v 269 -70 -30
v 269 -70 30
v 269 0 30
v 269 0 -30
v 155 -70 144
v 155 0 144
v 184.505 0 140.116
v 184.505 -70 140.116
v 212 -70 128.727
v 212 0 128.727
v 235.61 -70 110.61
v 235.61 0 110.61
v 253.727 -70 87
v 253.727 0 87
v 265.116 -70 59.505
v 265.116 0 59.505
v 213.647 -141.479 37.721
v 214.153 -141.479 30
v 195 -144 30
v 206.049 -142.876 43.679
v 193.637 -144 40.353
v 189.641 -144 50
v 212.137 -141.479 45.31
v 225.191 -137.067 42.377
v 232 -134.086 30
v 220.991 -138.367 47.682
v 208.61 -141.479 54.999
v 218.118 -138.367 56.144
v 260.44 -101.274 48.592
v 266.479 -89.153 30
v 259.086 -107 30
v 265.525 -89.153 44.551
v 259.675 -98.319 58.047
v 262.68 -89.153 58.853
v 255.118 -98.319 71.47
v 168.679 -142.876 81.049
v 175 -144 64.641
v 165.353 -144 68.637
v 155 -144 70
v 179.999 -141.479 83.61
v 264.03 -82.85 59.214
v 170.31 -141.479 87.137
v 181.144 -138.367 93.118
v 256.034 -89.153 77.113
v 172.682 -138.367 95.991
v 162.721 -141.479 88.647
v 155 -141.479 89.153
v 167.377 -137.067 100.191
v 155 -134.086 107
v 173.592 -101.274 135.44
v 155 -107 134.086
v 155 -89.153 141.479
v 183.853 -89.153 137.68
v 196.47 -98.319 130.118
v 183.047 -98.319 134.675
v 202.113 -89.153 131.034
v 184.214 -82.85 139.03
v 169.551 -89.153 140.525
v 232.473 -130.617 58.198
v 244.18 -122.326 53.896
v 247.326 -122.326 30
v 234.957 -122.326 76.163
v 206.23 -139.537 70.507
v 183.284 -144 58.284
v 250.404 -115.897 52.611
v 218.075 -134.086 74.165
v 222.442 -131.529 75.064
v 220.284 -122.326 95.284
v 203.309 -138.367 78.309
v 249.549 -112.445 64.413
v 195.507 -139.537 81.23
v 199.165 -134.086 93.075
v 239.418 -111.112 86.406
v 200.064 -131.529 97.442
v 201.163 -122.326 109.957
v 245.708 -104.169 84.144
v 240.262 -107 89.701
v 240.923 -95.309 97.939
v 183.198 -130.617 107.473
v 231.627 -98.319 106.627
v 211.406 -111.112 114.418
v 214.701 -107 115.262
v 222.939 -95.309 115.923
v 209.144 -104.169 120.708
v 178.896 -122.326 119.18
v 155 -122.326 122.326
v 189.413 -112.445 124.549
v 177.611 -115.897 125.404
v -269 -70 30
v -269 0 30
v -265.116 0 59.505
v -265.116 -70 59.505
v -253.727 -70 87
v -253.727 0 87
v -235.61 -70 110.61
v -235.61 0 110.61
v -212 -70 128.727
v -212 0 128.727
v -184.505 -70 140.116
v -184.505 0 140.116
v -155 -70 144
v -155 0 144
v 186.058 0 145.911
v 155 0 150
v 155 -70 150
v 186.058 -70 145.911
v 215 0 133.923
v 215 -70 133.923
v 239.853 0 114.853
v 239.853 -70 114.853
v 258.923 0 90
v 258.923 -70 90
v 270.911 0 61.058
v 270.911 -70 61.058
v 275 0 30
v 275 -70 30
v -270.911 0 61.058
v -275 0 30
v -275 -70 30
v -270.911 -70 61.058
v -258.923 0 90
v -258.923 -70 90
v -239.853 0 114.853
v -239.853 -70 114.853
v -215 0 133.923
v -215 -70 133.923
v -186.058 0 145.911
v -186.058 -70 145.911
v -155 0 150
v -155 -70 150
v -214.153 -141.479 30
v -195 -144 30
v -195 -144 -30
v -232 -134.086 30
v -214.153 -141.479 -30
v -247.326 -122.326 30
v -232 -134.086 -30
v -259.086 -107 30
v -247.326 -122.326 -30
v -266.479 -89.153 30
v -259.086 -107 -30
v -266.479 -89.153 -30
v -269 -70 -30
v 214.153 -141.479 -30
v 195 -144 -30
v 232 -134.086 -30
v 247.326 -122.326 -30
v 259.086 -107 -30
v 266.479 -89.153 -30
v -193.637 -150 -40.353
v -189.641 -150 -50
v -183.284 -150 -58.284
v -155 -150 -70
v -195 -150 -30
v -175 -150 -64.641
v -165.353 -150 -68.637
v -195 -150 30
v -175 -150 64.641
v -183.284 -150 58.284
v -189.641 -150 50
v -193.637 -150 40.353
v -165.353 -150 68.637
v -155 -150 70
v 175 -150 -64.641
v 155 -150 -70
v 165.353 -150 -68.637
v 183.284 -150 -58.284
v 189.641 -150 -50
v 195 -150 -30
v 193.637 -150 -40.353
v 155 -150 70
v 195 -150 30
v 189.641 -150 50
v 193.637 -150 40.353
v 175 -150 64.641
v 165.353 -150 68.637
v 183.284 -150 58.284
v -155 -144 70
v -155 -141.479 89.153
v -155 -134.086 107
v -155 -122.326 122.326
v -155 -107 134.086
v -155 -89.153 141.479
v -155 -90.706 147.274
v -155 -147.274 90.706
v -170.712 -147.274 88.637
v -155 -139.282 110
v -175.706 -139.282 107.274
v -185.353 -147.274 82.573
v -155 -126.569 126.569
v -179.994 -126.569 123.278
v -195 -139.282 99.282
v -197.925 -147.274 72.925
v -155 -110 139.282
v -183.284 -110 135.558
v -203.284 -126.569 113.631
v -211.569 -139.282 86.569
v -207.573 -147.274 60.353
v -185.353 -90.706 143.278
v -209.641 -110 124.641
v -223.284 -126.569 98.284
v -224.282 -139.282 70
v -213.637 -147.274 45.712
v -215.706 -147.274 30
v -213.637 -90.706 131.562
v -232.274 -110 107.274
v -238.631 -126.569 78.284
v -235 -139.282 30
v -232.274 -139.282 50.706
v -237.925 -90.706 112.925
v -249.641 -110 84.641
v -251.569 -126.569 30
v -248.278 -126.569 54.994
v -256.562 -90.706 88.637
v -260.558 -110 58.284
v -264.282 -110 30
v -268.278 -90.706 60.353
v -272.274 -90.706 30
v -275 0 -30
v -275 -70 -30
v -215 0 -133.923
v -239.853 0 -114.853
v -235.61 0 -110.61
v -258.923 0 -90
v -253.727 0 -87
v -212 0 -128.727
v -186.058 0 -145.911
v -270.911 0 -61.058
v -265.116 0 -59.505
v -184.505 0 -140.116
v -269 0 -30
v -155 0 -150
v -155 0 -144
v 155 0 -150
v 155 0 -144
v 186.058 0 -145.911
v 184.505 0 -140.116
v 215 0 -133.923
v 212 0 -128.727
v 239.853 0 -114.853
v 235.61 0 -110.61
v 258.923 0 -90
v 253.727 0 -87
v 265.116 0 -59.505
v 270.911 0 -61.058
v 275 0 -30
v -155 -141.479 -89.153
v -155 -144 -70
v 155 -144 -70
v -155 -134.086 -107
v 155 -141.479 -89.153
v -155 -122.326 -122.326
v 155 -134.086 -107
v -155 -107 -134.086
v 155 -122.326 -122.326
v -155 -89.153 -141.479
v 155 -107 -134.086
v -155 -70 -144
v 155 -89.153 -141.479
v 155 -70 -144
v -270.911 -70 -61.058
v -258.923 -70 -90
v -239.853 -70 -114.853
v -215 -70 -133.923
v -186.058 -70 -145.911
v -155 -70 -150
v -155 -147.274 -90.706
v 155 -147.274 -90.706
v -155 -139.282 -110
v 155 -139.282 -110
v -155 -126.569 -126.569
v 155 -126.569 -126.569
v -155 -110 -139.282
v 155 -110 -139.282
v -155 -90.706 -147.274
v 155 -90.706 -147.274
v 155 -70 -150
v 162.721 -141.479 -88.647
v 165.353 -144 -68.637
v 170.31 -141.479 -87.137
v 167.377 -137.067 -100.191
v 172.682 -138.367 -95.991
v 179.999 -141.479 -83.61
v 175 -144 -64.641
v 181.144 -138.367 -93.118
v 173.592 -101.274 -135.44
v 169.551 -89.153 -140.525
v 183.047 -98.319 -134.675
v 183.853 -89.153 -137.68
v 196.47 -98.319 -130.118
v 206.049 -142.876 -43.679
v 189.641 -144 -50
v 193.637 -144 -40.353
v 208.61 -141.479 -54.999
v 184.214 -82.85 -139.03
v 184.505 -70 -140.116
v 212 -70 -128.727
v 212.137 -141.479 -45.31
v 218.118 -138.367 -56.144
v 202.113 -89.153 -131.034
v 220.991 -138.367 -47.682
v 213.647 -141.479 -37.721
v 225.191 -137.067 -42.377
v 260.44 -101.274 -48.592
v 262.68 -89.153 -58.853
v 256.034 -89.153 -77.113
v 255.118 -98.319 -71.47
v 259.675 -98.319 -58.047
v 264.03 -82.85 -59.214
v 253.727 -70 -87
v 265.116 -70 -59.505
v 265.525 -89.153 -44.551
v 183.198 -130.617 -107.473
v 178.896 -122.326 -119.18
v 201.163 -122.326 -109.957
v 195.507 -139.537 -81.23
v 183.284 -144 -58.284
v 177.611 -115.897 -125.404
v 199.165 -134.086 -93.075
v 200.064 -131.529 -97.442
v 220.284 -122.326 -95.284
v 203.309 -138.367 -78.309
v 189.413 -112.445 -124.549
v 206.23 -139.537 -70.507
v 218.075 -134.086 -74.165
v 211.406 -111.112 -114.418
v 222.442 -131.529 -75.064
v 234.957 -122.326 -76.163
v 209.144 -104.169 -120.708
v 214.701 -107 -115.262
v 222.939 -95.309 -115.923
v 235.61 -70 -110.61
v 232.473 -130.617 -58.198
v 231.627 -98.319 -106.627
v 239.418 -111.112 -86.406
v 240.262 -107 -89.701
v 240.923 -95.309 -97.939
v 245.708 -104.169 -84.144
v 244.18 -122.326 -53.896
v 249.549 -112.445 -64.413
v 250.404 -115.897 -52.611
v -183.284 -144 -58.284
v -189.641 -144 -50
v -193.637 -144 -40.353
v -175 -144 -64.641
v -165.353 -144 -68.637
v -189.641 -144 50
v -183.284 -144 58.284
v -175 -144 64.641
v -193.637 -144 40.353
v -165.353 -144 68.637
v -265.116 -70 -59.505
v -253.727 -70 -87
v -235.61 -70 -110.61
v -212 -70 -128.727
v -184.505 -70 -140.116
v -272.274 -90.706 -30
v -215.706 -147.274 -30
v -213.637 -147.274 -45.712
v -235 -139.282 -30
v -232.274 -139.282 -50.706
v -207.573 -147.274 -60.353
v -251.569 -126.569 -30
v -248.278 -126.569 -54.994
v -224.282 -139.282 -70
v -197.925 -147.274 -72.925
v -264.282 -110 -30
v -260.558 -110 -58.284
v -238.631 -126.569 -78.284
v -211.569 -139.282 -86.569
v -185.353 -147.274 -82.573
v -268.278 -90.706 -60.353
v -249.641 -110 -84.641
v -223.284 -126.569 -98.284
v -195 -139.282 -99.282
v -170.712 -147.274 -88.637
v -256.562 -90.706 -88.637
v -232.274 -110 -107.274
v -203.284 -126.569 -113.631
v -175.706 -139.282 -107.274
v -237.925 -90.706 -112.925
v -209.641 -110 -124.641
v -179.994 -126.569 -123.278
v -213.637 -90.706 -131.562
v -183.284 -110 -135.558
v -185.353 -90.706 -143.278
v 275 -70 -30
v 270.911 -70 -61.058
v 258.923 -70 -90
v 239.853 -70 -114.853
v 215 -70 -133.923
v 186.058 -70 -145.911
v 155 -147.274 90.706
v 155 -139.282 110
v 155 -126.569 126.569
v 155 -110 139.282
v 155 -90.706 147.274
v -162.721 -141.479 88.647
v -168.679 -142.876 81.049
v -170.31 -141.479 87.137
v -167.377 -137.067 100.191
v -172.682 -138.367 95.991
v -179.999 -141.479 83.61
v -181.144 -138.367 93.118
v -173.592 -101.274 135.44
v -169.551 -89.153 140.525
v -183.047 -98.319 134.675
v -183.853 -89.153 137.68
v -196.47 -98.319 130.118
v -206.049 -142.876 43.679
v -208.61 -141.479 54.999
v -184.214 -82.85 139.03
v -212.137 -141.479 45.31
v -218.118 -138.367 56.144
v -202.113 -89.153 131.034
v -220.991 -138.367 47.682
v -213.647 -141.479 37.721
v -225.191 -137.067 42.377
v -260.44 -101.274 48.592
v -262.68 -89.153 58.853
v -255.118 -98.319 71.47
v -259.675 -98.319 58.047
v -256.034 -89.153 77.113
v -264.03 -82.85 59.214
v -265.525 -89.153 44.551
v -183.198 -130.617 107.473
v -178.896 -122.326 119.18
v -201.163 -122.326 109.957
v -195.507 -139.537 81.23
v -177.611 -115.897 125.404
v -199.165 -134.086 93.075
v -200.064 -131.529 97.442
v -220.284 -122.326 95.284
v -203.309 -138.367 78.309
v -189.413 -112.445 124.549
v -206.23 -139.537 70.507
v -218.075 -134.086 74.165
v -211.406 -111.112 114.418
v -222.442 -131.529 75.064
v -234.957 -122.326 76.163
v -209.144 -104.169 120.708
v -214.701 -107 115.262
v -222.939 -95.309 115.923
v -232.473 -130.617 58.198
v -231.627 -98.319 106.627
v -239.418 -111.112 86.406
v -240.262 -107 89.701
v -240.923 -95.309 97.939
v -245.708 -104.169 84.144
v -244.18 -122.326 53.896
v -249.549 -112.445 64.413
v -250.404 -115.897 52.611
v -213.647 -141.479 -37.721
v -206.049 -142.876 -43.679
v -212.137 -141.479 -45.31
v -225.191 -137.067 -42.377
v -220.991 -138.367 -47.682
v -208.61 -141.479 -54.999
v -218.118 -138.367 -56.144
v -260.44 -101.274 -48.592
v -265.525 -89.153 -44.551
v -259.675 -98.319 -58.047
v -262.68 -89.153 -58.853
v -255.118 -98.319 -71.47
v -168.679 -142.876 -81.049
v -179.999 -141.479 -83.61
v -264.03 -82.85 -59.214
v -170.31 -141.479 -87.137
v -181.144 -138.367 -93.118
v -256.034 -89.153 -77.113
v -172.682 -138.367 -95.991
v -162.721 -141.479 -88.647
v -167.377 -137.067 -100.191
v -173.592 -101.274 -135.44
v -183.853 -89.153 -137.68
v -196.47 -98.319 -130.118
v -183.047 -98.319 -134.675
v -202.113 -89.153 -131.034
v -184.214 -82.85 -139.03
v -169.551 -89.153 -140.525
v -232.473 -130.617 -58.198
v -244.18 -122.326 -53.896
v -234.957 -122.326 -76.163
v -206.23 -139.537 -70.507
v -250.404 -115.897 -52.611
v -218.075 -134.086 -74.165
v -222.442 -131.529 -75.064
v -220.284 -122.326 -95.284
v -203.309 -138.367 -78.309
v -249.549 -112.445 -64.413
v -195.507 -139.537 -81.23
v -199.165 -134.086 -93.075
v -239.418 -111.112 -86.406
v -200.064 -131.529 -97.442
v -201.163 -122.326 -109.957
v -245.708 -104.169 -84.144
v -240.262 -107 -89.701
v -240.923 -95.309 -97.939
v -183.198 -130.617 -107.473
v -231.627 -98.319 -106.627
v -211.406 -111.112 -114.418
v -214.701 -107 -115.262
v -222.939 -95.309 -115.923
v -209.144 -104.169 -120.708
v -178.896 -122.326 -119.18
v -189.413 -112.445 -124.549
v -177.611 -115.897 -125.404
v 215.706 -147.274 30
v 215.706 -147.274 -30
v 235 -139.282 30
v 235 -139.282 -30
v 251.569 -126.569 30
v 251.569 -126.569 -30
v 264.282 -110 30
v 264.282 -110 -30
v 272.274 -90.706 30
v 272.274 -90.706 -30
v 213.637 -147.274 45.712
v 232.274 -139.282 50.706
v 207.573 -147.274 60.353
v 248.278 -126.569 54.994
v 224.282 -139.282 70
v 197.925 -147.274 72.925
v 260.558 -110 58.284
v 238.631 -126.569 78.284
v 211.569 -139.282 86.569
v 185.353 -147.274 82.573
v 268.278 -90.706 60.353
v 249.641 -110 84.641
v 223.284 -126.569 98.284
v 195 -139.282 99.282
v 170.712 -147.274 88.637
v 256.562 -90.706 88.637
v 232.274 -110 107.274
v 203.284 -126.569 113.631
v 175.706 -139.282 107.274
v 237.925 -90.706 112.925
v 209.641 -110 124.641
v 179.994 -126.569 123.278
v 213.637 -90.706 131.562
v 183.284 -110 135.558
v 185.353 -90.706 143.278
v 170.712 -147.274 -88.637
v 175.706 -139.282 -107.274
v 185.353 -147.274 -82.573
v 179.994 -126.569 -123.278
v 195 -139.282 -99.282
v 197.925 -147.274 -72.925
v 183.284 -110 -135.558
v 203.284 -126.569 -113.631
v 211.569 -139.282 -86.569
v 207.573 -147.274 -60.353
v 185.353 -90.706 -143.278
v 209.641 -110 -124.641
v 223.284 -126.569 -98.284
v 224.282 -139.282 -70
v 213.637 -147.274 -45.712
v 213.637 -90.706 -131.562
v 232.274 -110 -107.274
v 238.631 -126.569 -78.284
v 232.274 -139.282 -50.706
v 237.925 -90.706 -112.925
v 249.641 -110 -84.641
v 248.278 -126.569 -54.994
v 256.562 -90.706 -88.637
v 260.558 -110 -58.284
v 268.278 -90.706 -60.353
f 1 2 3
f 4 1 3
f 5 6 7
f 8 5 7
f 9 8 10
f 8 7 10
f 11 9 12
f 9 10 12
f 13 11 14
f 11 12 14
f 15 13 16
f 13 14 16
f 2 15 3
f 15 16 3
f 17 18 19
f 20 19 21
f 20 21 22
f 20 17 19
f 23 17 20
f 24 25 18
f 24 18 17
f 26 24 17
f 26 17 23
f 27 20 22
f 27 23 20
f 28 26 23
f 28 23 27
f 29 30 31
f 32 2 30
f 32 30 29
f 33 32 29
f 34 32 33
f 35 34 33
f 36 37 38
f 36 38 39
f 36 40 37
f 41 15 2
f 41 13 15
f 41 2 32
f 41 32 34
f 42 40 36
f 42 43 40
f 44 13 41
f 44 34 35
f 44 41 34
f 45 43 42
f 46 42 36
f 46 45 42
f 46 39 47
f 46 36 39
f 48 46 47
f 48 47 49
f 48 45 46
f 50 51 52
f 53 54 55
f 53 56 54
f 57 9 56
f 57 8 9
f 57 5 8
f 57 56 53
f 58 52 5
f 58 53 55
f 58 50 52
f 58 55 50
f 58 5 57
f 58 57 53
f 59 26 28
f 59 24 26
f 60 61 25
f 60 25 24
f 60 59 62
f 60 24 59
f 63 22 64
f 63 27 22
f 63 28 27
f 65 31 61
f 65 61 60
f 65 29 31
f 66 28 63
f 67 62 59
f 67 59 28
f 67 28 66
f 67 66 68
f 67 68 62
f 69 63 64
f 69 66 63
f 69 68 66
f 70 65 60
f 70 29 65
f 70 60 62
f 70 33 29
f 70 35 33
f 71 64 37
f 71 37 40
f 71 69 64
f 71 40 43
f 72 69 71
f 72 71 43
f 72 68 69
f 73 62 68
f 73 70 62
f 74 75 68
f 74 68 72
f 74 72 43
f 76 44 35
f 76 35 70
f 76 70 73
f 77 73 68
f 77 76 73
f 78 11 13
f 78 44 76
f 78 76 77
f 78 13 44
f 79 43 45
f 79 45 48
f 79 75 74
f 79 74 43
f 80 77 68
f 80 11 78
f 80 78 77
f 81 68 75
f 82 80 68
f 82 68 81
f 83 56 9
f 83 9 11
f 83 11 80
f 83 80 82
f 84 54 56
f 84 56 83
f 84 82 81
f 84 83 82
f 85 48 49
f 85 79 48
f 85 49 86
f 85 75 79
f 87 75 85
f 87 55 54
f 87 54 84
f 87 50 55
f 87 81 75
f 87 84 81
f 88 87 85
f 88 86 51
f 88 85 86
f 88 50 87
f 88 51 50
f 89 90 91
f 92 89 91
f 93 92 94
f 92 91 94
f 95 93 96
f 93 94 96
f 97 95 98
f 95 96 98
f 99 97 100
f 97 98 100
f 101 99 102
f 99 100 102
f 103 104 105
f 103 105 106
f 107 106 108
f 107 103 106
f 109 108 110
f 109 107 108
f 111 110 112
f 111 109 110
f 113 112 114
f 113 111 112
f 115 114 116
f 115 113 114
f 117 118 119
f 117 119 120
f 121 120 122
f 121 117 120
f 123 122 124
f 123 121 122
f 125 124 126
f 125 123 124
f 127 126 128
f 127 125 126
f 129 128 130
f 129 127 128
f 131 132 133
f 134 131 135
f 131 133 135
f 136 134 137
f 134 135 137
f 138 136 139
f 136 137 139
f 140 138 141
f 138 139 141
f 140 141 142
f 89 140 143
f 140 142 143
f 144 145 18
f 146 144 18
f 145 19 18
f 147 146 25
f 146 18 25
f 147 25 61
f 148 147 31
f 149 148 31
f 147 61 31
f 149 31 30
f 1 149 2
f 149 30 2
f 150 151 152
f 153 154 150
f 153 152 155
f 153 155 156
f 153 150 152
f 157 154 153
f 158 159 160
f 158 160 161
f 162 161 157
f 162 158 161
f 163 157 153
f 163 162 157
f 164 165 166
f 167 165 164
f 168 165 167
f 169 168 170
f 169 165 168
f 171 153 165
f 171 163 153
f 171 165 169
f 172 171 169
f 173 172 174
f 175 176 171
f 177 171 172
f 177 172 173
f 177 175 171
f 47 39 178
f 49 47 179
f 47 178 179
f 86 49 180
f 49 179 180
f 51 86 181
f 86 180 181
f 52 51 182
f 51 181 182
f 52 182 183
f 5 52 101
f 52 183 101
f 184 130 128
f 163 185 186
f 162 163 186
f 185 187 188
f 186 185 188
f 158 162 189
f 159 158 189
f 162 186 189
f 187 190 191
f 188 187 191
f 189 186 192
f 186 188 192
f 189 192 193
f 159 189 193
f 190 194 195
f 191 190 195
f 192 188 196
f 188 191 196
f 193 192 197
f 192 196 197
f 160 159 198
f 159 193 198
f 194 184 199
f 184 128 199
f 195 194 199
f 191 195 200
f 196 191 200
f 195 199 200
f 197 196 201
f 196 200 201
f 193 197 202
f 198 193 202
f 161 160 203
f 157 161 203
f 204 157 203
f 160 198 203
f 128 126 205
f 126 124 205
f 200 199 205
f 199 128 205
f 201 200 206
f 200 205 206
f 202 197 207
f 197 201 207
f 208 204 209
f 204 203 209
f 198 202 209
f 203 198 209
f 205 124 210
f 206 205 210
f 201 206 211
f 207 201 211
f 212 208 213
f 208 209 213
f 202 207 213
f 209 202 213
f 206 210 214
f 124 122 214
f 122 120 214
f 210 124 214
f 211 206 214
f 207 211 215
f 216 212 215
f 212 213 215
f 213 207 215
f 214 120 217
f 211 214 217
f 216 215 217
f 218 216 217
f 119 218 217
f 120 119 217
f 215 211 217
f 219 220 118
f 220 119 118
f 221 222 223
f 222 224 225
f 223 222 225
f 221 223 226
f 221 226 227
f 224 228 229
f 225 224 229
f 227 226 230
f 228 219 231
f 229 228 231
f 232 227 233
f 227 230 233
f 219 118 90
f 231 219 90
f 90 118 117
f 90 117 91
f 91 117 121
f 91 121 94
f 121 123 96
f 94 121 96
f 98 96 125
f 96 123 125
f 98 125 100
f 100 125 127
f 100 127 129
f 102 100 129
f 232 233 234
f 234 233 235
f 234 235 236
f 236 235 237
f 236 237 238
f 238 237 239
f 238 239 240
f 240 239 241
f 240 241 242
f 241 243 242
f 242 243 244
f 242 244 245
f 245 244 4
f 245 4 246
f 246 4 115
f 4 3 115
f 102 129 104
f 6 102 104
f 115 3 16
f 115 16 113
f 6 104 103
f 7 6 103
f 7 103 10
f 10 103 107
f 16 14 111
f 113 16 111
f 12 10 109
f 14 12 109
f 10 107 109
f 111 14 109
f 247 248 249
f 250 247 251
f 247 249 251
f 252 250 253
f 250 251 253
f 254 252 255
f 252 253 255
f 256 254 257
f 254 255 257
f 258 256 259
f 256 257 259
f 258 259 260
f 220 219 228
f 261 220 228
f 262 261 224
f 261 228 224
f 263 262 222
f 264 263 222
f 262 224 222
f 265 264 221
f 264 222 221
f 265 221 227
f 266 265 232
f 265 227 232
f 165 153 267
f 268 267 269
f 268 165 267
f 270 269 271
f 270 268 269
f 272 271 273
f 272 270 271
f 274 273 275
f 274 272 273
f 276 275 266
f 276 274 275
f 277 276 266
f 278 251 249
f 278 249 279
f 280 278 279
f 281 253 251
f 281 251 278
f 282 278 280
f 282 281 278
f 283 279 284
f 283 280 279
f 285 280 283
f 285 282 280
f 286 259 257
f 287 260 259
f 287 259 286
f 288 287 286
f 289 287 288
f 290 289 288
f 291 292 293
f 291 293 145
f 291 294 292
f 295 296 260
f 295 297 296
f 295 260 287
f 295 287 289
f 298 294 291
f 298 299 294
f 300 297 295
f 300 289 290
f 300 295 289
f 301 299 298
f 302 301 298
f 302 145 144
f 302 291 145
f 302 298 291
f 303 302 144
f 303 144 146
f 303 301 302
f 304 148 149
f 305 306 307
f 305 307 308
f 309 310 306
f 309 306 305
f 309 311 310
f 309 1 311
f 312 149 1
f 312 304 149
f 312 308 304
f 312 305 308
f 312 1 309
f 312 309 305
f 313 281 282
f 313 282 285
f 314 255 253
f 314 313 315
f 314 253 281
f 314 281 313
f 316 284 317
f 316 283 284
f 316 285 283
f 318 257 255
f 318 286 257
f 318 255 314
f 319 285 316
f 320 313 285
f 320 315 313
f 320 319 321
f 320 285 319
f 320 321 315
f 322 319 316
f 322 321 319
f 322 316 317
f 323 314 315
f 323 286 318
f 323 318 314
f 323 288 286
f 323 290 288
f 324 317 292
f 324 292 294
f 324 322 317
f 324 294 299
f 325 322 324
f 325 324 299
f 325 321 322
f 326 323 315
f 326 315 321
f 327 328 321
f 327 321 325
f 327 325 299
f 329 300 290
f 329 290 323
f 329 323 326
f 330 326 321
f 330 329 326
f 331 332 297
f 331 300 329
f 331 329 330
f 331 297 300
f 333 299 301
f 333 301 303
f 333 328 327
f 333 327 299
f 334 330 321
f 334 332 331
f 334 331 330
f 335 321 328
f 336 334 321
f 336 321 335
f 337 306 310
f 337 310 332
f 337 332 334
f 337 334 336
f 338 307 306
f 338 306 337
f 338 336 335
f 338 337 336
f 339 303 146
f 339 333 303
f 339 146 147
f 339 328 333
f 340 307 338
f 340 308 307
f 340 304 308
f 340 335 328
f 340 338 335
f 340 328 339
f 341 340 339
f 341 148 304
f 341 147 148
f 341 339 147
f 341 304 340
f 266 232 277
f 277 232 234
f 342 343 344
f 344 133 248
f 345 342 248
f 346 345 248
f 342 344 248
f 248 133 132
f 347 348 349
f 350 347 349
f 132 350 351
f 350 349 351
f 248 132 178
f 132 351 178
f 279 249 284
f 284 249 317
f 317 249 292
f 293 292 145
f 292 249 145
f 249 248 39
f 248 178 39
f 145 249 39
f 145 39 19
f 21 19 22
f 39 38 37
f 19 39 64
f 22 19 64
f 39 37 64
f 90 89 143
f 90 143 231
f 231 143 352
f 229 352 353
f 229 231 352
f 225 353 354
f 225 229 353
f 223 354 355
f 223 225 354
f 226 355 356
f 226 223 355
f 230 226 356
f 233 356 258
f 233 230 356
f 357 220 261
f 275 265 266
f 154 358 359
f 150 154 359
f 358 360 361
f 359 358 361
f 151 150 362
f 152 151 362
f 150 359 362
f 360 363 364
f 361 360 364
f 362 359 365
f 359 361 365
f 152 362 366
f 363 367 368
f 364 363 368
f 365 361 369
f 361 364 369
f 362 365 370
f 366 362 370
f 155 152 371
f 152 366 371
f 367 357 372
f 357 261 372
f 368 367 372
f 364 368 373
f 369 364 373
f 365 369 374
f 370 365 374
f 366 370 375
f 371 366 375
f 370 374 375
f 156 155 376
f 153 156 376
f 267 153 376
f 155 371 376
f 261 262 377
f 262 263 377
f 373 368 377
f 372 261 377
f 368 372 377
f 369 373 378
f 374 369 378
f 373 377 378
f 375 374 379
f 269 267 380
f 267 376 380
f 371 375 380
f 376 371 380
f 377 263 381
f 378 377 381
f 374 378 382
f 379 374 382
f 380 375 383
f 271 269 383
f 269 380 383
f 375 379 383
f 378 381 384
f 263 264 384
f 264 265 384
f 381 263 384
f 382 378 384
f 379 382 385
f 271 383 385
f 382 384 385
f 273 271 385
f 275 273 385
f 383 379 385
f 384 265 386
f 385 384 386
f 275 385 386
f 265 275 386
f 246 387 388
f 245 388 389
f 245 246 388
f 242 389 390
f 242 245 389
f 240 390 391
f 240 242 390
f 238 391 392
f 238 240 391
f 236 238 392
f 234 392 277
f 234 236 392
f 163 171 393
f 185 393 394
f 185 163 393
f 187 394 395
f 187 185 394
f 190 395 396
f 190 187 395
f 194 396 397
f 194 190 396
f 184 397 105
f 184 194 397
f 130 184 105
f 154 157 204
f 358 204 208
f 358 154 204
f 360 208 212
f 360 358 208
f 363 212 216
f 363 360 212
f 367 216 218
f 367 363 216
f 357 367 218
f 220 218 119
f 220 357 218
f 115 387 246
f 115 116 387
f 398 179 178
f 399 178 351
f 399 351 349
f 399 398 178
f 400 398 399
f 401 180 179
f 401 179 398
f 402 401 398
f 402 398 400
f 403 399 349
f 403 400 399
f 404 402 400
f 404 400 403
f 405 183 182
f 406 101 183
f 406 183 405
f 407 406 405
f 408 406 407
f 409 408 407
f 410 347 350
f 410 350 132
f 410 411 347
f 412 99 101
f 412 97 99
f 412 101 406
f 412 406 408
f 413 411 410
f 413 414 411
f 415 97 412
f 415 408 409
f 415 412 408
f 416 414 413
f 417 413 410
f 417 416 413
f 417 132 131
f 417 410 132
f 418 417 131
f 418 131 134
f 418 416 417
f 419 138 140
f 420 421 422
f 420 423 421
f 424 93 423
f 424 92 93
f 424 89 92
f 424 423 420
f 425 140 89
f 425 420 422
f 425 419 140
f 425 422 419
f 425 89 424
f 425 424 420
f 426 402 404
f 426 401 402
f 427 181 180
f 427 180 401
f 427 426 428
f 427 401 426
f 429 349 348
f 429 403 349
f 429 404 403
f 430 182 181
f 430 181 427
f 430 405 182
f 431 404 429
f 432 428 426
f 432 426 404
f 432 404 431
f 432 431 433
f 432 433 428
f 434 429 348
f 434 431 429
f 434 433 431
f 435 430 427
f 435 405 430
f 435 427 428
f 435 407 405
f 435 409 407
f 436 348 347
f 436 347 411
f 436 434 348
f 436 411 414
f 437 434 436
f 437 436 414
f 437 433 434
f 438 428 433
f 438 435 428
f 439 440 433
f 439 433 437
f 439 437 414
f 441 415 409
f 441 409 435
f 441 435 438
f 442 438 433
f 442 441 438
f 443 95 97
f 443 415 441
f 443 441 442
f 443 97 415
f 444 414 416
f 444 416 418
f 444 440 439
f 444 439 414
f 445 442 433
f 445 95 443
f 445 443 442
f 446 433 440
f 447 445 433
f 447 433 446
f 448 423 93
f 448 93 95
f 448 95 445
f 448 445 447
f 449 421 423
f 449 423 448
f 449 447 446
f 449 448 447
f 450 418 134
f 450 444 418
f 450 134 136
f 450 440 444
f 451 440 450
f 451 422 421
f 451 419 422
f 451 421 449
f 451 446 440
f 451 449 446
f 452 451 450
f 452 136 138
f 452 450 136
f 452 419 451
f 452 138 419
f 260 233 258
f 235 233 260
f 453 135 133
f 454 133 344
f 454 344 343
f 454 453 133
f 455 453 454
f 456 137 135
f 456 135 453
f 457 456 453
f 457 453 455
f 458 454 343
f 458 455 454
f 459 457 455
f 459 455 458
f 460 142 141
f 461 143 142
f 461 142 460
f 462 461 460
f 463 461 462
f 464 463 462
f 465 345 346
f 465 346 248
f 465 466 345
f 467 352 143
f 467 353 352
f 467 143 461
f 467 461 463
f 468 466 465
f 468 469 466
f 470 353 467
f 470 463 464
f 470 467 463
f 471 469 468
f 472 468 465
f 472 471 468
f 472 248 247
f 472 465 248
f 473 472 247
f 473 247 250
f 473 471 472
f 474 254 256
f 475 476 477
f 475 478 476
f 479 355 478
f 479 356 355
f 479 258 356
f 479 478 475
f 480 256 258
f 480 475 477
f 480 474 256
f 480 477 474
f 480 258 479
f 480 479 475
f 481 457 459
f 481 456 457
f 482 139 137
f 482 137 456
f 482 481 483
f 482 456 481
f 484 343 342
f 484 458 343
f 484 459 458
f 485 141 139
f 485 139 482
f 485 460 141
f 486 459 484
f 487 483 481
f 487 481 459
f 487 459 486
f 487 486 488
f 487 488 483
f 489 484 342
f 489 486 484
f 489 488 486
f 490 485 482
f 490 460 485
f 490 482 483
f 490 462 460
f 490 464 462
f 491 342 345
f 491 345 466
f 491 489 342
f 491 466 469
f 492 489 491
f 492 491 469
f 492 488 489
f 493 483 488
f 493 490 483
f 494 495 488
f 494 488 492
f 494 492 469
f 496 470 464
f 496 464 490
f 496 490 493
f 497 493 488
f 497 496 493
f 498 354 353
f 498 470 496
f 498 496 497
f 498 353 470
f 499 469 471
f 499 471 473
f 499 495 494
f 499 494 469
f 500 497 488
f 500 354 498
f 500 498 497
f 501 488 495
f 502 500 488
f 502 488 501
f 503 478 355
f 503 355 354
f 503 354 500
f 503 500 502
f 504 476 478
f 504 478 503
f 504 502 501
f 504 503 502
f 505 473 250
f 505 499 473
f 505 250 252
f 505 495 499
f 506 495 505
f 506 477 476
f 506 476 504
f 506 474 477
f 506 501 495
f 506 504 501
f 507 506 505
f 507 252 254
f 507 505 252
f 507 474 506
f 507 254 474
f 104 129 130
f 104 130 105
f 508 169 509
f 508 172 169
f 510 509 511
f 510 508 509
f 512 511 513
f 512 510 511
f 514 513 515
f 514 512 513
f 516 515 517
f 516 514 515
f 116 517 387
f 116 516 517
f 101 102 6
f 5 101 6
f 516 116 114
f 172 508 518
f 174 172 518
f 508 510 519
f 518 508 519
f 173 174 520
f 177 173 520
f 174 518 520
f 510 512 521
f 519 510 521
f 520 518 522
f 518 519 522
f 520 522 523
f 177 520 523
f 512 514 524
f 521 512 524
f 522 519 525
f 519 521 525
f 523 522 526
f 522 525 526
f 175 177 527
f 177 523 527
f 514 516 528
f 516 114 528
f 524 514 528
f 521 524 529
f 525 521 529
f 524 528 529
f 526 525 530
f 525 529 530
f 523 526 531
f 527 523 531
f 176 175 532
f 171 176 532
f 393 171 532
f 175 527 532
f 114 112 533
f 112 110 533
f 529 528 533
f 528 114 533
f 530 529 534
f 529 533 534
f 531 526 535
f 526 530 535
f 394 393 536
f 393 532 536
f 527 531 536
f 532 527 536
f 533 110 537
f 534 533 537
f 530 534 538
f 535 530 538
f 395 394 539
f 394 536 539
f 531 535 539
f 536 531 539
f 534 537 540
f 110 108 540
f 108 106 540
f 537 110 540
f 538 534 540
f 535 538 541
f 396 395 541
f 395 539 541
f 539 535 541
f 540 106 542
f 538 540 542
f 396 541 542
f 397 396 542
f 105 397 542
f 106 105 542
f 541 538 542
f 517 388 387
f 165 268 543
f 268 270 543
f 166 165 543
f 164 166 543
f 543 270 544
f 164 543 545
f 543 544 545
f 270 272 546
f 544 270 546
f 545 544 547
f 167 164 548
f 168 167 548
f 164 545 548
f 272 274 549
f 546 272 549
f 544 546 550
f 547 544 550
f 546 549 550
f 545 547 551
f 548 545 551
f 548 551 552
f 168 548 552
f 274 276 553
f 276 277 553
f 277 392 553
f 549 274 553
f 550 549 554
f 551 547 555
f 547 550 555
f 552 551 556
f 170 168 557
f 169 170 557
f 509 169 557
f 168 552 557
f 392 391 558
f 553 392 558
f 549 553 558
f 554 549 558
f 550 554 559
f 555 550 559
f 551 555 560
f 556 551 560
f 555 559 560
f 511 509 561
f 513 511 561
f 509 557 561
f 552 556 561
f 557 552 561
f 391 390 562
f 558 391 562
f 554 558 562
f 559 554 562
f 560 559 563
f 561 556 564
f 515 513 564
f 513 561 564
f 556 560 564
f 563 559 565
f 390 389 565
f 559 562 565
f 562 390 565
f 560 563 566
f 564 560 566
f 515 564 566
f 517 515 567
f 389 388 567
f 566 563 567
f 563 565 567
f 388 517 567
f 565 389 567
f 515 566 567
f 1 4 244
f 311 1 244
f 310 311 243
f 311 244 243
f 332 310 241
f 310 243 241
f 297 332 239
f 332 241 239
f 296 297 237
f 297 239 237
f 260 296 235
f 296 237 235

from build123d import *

# Parameters (mm, degrees)
CROQUIS1_W              = 550
CROQUIS1_H              = 150
SALIENTE_EXTRUIR1_DEPTH = 150
REDONDEO1_R             = 120
REDONDEO2_R             = 80
VACIADO1_T              = -6


with BuildPart() as part:
    # Croquis1 → Saliente-Extruir1 (new body, symmetric)
    with BuildSketch(Plane.XY):
        with Locations((0, -75)):
            Rectangle(CROQUIS1_W, CROQUIS1_H)
    extrude(amount=SALIENTE_EXTRUIR1_DEPTH, both=True)

    # Redondeo1
    redondeo1_edges = [part.edges().sort_by_distance(p)[0] for p in [
        (275, -75, 150),
        (-275, -75, 150),
        (275, -75, -150),
        (-275, -75, -150),
    ]]
    fillet(redondeo1_edges, radius=REDONDEO1_R)

    # Redondeo2
    redondeo2_edges = [part.edges().sort_by_distance(p)[0] for p in [
        (275, -150, 0),
        (0, -150, -150),
        (0, -150, 150),
        (-275, -150, 0),
        (-239.852813742, -150, 114.852813742),
        (-239.852813742, -150, -114.852813742),
        (239.852813742, -150, 114.852813742),
        (239.852813742, -150, -114.852813742),
    ]]
    fillet(redondeo2_edges, radius=REDONDEO2_R)

    # Vaciado1
    vaciado1_openings = [part.faces().sort_by_distance(p)[0] for p in [
        (0, 0, 0),
    ]]
    offset(amount=VACIADO1_T, openings=vaciado1_openings, kind=Kind.INTERSECTION)


solid = part.part
